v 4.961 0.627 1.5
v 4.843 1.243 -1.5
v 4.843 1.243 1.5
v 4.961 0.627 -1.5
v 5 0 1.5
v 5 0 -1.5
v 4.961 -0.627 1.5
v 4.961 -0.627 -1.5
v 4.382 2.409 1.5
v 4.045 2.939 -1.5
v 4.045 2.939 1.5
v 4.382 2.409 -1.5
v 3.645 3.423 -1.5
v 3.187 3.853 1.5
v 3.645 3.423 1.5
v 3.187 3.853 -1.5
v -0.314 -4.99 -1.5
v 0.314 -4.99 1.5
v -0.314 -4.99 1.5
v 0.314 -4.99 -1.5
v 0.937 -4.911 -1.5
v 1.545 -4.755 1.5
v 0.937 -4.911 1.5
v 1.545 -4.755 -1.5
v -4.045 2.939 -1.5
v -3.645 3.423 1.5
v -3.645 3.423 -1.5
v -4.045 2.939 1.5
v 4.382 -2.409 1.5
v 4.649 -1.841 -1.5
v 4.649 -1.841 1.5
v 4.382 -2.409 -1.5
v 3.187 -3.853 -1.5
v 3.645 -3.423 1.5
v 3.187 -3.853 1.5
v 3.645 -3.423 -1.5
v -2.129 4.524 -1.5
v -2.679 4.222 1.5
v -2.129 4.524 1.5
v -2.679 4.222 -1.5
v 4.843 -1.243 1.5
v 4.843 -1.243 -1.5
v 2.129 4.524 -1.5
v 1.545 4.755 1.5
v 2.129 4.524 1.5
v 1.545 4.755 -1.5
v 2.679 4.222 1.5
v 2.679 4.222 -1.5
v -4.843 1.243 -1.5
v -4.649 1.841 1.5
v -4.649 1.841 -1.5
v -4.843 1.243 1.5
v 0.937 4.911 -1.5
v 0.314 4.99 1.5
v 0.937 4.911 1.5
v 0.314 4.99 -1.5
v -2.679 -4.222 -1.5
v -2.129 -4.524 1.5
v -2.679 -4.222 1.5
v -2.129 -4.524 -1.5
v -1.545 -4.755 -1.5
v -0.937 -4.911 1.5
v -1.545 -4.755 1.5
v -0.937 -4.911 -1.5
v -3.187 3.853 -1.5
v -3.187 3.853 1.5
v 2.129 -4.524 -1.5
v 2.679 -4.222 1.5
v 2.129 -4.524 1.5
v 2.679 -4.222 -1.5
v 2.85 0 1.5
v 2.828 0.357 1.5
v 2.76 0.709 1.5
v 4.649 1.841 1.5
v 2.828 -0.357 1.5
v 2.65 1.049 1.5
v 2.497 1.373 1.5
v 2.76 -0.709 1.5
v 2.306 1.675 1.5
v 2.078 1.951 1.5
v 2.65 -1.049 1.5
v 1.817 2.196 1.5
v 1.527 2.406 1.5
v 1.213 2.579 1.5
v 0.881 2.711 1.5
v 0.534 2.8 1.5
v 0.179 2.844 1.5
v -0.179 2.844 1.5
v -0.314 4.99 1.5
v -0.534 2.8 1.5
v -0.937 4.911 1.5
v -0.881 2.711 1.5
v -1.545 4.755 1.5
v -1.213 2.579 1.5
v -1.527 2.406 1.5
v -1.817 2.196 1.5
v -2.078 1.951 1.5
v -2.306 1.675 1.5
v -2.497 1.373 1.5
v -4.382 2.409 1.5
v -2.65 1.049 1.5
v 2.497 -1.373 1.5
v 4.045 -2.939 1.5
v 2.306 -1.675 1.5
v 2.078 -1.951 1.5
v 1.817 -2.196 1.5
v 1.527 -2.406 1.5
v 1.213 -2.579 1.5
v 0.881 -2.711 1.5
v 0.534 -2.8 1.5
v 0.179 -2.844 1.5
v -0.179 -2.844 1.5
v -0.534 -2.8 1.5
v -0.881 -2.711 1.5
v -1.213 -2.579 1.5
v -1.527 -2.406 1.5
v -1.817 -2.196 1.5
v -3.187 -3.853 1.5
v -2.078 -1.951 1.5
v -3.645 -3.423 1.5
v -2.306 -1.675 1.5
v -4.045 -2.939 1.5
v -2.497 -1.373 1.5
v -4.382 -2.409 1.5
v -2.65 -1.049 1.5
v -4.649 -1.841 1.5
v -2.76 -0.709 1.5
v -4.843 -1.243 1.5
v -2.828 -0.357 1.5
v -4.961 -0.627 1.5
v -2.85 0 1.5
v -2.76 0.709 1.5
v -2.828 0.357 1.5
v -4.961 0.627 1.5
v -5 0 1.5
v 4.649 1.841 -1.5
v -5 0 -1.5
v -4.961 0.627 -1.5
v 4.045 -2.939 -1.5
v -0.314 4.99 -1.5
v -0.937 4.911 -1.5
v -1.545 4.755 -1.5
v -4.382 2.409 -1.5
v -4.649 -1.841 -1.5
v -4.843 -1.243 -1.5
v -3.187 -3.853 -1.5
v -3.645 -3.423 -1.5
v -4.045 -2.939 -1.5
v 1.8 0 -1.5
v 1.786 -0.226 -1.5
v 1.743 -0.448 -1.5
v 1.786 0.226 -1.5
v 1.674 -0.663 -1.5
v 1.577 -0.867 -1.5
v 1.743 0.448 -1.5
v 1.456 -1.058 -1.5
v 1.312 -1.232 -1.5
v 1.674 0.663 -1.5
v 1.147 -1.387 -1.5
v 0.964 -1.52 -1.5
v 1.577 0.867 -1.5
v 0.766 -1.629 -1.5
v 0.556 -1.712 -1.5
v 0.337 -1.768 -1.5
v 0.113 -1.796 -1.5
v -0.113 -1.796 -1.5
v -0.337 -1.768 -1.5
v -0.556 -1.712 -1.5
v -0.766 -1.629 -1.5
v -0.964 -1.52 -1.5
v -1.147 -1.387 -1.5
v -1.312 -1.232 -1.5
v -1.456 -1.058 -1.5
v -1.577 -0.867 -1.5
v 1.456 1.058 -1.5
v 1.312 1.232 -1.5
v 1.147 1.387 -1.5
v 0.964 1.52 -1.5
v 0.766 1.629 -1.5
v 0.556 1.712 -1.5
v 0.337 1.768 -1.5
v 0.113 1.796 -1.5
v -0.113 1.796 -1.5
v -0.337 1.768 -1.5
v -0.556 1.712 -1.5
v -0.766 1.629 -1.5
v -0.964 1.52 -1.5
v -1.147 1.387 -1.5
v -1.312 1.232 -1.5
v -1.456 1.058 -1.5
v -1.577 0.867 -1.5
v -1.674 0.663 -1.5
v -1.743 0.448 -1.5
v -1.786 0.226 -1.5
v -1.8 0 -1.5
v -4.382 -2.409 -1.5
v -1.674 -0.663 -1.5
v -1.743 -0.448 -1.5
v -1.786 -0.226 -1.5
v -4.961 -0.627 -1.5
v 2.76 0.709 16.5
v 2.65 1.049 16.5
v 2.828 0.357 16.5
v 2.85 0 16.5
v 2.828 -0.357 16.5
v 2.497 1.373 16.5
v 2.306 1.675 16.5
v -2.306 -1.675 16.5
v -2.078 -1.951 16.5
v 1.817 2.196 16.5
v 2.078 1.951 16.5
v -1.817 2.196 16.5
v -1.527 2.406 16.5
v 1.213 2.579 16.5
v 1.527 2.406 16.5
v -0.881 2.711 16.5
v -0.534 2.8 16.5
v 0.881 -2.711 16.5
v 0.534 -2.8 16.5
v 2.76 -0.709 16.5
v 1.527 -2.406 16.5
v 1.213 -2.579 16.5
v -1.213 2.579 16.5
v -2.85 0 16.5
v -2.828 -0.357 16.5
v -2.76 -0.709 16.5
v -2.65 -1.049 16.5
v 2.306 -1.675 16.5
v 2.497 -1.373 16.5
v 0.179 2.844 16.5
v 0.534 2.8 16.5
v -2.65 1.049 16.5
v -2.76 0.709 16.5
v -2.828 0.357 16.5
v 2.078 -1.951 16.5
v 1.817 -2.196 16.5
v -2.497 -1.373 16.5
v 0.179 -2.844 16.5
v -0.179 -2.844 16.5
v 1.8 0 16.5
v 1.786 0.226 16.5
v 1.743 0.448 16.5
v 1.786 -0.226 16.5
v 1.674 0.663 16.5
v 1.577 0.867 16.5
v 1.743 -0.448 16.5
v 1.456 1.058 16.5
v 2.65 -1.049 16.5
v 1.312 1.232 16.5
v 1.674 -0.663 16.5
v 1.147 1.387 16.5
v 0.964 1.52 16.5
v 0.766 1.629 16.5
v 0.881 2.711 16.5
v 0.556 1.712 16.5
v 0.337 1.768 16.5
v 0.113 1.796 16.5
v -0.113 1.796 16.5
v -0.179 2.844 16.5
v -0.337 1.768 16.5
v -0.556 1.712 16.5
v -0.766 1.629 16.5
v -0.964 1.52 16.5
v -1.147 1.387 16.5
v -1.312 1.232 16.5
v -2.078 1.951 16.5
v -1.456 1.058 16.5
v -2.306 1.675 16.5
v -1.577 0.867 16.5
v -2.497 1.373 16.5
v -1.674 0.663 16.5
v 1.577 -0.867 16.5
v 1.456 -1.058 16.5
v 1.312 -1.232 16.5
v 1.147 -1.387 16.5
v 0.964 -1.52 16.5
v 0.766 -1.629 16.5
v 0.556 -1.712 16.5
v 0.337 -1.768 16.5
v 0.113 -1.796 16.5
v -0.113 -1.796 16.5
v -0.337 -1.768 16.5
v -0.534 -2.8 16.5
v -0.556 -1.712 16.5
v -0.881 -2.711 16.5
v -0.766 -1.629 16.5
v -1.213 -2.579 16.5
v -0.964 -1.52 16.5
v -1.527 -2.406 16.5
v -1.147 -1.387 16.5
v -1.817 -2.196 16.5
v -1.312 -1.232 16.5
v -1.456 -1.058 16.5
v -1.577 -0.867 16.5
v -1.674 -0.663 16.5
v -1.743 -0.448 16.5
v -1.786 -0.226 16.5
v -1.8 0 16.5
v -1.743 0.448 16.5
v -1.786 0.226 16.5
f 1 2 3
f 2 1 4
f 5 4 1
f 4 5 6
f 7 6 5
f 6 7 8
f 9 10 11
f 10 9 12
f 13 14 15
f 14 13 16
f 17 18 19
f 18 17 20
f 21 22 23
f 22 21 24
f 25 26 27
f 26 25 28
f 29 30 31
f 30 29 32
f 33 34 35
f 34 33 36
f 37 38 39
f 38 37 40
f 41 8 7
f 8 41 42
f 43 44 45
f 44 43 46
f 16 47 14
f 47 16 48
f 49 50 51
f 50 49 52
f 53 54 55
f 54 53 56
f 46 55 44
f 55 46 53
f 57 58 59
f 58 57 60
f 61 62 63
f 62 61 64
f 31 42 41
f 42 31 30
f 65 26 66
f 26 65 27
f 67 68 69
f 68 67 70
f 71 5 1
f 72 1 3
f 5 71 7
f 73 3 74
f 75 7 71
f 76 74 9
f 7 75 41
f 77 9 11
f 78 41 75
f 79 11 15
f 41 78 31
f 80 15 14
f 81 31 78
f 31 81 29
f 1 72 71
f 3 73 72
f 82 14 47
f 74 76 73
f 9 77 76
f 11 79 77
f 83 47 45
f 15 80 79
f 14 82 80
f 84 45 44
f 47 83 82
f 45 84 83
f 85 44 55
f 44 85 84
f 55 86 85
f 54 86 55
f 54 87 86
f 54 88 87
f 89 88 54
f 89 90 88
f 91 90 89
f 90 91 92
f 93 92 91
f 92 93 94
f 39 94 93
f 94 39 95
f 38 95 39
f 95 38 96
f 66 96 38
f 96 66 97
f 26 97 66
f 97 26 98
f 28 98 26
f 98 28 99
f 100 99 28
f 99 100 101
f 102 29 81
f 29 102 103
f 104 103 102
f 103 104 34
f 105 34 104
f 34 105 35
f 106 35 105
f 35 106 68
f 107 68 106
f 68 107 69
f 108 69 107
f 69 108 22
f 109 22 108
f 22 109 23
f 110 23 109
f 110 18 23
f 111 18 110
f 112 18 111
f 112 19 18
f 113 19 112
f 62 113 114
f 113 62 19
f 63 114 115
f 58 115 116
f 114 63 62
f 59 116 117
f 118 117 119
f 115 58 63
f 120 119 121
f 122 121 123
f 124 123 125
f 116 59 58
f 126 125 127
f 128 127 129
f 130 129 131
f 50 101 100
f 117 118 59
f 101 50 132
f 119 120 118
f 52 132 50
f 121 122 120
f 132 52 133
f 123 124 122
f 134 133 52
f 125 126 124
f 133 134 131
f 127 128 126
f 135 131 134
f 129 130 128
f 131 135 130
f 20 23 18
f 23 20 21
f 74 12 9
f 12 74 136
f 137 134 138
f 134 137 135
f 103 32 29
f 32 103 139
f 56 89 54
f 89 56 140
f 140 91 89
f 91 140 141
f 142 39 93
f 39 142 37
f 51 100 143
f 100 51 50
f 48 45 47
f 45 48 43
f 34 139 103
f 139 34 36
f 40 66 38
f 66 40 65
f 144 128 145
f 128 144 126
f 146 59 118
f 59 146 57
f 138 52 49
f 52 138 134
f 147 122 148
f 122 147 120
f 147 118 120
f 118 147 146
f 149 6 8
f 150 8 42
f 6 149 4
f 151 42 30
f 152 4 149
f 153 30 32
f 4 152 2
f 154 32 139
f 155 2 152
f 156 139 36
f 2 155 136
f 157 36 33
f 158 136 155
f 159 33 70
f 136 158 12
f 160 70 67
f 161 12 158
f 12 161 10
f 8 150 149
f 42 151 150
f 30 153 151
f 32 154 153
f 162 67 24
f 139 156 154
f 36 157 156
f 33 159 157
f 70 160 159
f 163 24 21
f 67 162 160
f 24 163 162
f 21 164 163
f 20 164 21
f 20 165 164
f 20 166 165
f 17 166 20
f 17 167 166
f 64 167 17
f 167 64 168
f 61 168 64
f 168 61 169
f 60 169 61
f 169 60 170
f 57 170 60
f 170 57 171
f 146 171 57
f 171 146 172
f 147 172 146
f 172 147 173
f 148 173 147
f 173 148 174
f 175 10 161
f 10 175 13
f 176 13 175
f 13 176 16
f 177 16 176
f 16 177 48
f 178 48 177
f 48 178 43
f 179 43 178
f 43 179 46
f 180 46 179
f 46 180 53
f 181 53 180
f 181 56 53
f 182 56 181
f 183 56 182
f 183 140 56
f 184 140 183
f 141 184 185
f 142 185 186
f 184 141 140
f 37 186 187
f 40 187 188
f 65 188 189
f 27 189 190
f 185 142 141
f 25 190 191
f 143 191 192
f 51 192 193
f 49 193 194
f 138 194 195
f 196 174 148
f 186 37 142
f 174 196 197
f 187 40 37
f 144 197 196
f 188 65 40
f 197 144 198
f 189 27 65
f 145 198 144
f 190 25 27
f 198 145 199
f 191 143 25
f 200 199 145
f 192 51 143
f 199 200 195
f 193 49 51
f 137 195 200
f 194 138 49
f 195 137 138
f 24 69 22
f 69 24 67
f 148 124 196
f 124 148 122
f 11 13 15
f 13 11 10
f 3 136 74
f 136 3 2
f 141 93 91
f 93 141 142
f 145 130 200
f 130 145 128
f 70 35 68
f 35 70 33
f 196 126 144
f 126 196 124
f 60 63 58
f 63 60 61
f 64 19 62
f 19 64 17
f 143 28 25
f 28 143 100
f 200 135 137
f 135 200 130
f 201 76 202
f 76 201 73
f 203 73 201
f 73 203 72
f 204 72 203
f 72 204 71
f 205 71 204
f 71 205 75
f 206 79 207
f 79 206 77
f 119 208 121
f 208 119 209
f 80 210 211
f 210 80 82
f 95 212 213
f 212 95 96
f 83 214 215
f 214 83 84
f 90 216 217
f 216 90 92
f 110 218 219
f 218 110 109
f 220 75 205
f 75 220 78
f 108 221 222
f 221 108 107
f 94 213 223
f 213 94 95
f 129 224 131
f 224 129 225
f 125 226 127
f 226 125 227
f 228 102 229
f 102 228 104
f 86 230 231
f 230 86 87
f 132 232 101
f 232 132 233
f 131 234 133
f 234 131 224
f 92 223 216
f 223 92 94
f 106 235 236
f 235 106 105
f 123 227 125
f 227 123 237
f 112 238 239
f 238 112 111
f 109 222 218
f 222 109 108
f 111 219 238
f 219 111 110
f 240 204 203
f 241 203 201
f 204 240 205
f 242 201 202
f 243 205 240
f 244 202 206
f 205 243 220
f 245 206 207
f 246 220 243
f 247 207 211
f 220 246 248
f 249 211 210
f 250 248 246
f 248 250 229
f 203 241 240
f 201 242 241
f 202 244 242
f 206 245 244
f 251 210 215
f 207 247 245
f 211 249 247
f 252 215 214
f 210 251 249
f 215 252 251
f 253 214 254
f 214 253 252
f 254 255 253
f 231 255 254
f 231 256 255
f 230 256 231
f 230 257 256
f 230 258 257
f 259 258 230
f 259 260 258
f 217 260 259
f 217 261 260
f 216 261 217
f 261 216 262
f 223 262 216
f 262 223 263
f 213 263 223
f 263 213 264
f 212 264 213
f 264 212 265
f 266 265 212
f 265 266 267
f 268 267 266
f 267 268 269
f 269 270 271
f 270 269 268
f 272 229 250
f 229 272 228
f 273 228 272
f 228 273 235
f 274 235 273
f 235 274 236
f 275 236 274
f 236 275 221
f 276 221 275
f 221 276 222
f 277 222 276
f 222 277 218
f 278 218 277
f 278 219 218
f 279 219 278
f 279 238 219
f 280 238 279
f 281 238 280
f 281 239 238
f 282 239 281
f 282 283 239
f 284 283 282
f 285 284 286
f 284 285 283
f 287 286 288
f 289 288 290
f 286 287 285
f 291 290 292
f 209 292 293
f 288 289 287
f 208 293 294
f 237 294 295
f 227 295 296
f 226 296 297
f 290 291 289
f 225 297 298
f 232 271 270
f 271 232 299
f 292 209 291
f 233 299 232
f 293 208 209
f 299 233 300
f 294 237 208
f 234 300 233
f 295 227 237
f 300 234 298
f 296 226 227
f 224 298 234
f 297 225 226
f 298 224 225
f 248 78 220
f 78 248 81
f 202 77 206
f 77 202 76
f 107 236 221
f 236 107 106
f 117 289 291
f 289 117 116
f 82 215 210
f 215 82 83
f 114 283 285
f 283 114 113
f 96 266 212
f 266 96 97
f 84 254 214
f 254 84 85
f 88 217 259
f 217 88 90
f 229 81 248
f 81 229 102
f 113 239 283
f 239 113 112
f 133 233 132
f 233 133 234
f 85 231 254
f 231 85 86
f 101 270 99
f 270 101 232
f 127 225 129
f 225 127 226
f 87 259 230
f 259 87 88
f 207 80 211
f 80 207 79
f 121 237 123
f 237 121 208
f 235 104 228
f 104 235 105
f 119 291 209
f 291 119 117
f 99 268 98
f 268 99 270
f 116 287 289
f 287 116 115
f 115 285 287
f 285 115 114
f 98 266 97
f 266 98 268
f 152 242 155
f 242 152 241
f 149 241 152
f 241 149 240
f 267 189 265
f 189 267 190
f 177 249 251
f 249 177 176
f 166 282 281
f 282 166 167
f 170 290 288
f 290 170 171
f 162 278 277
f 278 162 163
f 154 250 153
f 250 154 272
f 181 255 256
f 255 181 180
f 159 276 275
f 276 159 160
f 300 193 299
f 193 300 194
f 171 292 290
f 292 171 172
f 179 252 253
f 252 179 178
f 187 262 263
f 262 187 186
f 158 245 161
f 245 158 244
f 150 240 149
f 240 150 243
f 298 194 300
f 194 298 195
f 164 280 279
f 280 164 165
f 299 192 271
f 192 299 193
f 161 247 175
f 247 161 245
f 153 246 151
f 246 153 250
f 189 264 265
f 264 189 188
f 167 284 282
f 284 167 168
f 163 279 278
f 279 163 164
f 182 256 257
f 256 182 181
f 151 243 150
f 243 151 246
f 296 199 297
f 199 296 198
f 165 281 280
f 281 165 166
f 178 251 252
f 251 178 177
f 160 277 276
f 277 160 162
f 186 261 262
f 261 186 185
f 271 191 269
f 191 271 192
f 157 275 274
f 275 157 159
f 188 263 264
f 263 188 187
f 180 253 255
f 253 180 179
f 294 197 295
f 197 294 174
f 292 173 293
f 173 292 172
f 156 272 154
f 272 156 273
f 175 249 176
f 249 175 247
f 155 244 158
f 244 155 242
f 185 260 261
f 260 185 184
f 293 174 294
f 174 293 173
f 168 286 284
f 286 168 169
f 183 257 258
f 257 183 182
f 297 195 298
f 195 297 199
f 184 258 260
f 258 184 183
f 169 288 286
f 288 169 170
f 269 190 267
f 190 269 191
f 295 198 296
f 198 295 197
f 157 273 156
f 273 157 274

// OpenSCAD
$fn = 50;


difference() {
	union() {
		translate(v = [0, 0, -1.5000000000]) {
			cylinder(h = 3, r = 5.0000000000);
		}
		translate(v = [0, 0, -1.5000000000]) {
			cylinder(h = 18, r = 2.8500000000);
		}
	}
	union() {
		translate(v = [0, 0, -50.0000000000]) {
			cylinder(h = 100, r = 1.8000000000);
		}
	}
}
